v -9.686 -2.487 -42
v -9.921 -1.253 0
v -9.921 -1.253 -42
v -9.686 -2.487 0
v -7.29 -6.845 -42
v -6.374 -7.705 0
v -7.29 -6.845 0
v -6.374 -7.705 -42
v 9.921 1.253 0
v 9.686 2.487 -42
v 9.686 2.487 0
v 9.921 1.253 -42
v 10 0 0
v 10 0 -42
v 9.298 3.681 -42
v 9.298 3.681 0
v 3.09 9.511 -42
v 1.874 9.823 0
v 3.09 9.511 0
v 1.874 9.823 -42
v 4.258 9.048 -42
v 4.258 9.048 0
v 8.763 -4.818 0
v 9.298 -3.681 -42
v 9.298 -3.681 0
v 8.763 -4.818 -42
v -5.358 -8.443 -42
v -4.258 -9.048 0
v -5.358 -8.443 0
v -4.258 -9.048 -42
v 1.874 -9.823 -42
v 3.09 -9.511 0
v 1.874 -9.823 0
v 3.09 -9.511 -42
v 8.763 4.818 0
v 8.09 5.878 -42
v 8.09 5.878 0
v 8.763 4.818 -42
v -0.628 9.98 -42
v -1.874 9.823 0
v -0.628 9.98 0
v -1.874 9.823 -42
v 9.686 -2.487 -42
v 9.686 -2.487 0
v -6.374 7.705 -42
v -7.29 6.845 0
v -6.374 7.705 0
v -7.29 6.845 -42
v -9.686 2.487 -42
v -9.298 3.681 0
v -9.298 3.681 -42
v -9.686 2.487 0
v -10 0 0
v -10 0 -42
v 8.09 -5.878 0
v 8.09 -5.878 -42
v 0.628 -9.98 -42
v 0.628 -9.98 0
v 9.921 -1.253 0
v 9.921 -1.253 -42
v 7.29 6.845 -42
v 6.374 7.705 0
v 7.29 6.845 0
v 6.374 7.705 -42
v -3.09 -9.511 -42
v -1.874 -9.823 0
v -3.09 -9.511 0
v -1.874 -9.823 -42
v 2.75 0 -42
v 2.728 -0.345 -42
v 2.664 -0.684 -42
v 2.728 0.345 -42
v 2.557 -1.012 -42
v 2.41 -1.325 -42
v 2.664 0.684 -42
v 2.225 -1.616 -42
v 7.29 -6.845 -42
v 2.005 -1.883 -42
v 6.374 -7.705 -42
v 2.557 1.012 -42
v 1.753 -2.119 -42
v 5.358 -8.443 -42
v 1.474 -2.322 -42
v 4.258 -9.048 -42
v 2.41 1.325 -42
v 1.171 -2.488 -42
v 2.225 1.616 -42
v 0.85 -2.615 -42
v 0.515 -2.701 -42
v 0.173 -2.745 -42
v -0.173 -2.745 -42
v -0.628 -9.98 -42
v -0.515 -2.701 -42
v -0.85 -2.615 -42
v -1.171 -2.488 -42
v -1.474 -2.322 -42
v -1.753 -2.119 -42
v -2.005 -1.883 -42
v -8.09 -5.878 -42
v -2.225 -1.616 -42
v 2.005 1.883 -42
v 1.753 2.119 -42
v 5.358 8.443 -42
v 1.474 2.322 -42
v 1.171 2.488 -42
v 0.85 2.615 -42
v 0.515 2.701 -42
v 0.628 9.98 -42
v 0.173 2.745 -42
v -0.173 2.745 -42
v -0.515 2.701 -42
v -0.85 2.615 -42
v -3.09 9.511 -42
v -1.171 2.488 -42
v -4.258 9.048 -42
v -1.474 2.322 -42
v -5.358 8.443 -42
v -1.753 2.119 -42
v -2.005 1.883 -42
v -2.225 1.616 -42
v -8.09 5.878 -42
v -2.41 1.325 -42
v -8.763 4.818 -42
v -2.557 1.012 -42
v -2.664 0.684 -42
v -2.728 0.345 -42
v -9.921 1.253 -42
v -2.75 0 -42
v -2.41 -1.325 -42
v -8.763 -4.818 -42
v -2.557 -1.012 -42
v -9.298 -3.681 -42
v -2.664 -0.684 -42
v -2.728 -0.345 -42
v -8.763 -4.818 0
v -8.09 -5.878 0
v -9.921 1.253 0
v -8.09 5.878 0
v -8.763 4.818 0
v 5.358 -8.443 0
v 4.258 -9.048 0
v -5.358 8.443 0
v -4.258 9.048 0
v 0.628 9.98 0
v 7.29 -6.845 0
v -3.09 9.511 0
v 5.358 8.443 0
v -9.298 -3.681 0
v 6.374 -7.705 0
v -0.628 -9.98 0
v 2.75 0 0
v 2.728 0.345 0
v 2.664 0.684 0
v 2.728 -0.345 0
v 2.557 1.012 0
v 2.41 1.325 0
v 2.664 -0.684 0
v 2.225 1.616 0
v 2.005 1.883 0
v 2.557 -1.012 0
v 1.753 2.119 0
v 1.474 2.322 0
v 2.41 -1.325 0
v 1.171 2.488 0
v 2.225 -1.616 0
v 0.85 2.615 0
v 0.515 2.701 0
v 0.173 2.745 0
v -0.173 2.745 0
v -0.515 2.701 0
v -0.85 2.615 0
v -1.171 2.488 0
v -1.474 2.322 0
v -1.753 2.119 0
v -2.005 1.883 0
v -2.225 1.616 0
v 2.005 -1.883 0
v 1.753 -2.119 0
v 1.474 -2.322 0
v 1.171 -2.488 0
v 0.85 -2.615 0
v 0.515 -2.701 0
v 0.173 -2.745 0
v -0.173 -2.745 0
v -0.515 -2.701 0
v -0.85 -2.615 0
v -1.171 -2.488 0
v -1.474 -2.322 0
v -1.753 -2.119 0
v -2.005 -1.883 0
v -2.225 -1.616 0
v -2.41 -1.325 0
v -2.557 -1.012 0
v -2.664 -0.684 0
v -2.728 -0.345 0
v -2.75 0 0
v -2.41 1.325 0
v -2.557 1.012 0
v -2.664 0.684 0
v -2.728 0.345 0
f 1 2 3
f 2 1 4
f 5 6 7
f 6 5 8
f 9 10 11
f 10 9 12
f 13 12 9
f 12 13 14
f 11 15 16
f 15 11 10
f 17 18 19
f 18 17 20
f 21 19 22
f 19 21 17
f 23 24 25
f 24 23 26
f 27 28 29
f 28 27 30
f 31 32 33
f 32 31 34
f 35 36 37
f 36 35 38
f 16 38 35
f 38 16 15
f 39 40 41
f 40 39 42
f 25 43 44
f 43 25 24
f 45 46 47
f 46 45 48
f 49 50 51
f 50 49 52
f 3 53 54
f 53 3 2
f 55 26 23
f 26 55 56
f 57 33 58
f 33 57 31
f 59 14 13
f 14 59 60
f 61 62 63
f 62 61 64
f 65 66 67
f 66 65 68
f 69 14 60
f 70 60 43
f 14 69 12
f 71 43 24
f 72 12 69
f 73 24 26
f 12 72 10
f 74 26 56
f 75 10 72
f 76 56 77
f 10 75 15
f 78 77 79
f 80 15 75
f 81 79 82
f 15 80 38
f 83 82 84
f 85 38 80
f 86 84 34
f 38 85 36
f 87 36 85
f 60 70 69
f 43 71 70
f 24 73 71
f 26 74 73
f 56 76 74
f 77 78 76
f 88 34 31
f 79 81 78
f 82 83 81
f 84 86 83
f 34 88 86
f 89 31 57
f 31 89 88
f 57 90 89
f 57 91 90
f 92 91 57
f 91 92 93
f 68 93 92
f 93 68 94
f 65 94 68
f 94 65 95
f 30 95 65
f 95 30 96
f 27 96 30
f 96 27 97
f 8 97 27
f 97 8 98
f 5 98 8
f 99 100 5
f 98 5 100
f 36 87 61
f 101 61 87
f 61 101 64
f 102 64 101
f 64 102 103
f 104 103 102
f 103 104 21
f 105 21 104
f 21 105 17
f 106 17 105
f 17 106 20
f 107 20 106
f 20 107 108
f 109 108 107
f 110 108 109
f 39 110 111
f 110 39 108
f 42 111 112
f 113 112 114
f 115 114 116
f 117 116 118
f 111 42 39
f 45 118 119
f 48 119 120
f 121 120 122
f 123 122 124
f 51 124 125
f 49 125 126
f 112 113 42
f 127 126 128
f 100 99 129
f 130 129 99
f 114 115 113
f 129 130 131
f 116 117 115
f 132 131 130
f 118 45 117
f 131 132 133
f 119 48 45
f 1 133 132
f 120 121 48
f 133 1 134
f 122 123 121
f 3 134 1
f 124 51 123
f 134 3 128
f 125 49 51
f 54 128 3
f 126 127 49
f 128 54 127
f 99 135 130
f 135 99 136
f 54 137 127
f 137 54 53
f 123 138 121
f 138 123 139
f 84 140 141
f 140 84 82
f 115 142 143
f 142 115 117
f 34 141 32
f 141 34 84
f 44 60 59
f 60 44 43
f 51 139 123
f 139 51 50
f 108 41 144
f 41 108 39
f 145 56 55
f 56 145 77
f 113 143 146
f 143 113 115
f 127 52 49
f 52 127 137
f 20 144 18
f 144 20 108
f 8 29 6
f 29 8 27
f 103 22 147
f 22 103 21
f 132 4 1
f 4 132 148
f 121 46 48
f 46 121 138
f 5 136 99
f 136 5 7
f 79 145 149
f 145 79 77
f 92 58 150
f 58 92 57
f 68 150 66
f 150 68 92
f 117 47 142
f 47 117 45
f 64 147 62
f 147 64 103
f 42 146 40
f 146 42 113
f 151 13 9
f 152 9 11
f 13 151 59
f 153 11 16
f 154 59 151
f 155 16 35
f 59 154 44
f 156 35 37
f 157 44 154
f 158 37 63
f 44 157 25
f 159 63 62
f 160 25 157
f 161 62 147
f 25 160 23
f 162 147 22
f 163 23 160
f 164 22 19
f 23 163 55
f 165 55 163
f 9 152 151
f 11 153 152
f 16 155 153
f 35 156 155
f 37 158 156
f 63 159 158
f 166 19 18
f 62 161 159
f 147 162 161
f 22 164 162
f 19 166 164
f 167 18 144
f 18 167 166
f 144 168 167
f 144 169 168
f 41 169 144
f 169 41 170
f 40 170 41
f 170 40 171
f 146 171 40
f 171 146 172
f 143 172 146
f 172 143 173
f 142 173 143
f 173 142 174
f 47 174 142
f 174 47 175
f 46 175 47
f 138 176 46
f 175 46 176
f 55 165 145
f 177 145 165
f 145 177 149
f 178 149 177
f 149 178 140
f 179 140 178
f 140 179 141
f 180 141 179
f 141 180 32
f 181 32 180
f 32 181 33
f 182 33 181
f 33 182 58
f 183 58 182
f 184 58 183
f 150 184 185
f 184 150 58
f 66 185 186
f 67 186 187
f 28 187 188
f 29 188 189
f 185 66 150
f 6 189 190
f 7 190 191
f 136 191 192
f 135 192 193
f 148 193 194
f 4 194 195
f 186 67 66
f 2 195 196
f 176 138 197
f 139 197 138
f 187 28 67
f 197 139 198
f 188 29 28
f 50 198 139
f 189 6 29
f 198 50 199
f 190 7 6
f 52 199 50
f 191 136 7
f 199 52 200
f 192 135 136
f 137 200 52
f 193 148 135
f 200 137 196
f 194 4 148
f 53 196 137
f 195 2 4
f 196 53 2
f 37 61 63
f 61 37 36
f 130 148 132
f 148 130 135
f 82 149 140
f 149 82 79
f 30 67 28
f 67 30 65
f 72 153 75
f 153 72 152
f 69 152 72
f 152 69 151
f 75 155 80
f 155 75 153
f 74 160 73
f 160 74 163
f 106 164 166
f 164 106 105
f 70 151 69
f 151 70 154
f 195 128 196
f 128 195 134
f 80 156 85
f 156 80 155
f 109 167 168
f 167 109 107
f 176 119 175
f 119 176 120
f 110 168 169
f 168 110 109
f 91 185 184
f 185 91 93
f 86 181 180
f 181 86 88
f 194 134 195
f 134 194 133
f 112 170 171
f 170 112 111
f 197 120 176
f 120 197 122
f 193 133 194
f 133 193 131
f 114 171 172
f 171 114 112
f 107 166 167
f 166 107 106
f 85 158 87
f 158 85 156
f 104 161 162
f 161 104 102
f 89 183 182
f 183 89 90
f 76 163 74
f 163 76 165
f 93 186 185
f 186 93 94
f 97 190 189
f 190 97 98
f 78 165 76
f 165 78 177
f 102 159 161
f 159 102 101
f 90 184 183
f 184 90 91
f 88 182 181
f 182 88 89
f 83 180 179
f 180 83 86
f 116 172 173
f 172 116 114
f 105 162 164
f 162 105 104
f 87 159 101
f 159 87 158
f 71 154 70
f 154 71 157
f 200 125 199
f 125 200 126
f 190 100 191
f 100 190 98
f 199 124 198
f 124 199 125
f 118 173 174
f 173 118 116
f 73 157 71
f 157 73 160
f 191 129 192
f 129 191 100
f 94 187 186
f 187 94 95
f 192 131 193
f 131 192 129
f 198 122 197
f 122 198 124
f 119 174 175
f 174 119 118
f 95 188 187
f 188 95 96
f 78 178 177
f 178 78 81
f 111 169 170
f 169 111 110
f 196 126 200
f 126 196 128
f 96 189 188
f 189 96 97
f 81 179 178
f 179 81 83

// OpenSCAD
$fn = 50;


difference() {
	union() {
		translate(v = [0, 0, -42.0000000000]) {
			cylinder(h = 42, r = 10.0000000000);
		}
		cylinder(h = 0, r = 20.0000000000);
	}
	union() {
		#translate(v = [0, 0, -42]) {
			cylinder(h = 42, r = 2.7500000000);
		}
	}
}
